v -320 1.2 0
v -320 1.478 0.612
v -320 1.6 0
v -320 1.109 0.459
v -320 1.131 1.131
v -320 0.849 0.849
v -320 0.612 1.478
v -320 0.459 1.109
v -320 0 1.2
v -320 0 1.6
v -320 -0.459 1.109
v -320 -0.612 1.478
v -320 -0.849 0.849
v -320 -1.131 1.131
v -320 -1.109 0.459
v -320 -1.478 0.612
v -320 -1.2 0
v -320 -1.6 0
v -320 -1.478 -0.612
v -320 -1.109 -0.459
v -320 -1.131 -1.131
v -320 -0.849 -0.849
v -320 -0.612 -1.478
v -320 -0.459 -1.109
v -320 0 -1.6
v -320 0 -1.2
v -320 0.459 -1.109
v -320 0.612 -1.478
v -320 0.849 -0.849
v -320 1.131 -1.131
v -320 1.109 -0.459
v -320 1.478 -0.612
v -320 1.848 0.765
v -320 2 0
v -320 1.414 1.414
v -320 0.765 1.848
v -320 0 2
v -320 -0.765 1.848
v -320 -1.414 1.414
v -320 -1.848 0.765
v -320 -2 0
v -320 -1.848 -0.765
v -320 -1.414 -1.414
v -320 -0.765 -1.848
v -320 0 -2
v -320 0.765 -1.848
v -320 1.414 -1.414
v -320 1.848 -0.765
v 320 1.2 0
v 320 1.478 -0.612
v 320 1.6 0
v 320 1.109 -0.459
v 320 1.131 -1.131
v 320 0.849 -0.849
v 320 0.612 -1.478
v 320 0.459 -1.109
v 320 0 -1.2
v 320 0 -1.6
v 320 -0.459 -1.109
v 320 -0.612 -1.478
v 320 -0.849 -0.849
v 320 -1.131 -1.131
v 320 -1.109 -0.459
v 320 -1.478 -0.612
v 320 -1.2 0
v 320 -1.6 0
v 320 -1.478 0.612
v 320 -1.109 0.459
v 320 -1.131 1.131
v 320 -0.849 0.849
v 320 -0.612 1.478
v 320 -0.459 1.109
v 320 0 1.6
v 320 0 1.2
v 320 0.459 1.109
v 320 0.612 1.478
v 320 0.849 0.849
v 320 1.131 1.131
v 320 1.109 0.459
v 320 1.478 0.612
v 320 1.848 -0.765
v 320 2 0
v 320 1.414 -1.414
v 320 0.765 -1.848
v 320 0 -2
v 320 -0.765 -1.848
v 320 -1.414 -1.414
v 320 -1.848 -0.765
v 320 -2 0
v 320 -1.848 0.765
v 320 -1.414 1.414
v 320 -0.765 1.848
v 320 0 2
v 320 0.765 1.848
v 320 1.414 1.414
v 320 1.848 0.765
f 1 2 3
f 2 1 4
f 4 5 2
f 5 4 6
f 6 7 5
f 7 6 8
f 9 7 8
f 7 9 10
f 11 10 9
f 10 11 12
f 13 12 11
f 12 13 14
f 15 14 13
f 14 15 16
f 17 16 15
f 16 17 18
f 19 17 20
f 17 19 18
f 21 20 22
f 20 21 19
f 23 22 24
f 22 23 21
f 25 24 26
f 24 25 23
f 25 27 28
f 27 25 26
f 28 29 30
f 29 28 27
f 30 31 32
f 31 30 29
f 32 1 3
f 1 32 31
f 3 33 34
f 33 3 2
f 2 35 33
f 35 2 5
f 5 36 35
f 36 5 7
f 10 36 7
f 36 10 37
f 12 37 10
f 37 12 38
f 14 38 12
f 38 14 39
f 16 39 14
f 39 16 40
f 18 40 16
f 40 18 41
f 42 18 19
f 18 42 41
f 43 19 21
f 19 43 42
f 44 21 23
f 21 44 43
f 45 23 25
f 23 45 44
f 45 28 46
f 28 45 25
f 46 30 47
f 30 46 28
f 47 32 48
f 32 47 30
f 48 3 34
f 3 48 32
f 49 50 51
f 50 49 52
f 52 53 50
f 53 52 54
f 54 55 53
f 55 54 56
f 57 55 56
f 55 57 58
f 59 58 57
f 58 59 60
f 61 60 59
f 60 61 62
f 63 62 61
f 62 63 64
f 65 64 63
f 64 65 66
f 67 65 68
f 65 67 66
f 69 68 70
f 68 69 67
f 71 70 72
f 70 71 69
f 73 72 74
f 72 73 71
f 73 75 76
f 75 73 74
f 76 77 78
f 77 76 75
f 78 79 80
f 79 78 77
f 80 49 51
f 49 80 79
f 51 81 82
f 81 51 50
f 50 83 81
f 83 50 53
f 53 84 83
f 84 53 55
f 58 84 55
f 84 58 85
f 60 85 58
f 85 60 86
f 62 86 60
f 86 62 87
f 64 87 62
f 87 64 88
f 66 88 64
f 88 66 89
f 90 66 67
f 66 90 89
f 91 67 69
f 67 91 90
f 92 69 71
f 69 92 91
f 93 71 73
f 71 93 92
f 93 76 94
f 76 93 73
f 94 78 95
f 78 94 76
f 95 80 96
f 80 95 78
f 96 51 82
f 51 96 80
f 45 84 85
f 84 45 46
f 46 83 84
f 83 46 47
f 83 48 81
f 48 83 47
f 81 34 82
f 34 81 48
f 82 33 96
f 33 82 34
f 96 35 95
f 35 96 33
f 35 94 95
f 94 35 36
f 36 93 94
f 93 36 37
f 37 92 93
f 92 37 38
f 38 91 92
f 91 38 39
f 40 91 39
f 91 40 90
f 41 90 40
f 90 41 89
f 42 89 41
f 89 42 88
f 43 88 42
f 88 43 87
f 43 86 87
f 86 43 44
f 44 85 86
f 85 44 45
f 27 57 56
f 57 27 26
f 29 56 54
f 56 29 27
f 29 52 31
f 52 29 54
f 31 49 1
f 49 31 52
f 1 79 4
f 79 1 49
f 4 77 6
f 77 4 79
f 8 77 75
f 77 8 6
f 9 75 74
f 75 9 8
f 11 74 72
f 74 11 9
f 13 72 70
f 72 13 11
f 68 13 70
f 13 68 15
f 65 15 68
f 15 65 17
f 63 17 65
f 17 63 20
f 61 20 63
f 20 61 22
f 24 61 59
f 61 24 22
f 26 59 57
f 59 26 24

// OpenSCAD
// file: ../p/4-4disc.scad
use <../lib.scad>
$fa=1; $fs=0.2;
function ldraw_lib__4_4disc(realsolid=false) = [
// 0 Disc 1.0
// 0 Name: 4-4disc.dat
// 0 Author: James Jessiman
// 0 !LDRAW_ORG Primitive UPDATE 2002-02
// 0 !LICENSE Licensed under CC BY 2.0 and CC BY 4.0 : see CAreadme.txt
// 
// 0 BFC CERTIFY CCW
  [0,"BFC","CERTIFY"],
  [0,"BFC","CCW"],
// 
// 0 !HISTORY 1998-12-15 [PTadmin] Official Update 1998-10
// 0 !HISTORY 2002-03-23 [sbliss] Added BFC statement
// 0 !HISTORY 2002-04-25 [PTadmin] Official Update 2002-02
// 0 !HISTORY 2007-06-24 [PTadmin] Header formatted for Contributor Agreement
// 0 !HISTORY 2008-07-01 [PTadmin] Official Update 2008-01
// 
// 
// 3 16 0 0 0 1 0 0 0.9239 0 0.3827
  [3,16,0,0,0,1,0,0,0.9239,0,0.3827],
// 3 16 0 0 0 0.9239 0 0.3827 0.7071 0 0.7071
  [3,16,0,0,0,0.9239,0,0.3827,0.7071,0,0.7071],
// 3 16 0 0 0 0.7071 0 0.7071 0.3827 0 0.9239
  [3,16,0,0,0,0.7071,0,0.7071,0.3827,0,0.9239],
// 3 16 0 0 0 0.3827 0 0.9239 0 0 1
  [3,16,0,0,0,0.3827,0,0.9239,0,0,1],
// 3 16 0 0 0 0 0 1 -0.3827 0 0.9239
  [3,16,0,0,0,0,0,1,-0.3827,0,0.9239],
// 3 16 0 0 0 -0.3827 0 0.9239 -0.7071 0 0.7071
  [3,16,0,0,0,-0.3827,0,0.9239,-0.7071,0,0.7071],
// 3 16 0 0 0 -0.7071 0 0.7071 -0.9239 0 0.3827
  [3,16,0,0,0,-0.7071,0,0.7071,-0.9239,0,0.3827],
// 3 16 0 0 0 -0.9239 0 0.3827 -1 0 -0
  [3,16,0,0,0,-0.9239,0,0.3827,-1,0,-0],
// 3 16 0 0 0 -1 0 -0 -0.9239 0 -0.3827
  [3,16,0,0,0,-1,0,-0,-0.9239,0,-0.3827],
// 3 16 0 0 0 -0.9239 0 -0.3827 -0.7071 0 -0.7071
  [3,16,0,0,0,-0.9239,0,-0.3827,-0.7071,0,-0.7071],
// 3 16 0 0 0 -0.7071 0 -0.7071 -0.3827 0 -0.9239
  [3,16,0,0,0,-0.7071,0,-0.7071,-0.3827,0,-0.9239],
// 3 16 0 0 0 -0.3827 0 -0.9239 0 0 -1
  [3,16,0,0,0,-0.3827,0,-0.9239,0,0,-1],
// 3 16 0 0 0 0 0 -1 0.3827 0 -0.9239
  [3,16,0,0,0,0,0,-1,0.3827,0,-0.9239],
// 3 16 0 0 0 0.3827 0 -0.9239 0.7071 0 -0.7071
  [3,16,0,0,0,0.3827,0,-0.9239,0.7071,0,-0.7071],
// 3 16 0 0 0 0.7071 0 -0.7071 0.9239 0 -0.3827
  [3,16,0,0,0,0.7071,0,-0.7071,0.9239,0,-0.3827],
// 3 16 0 0 0 0.9239 0 -0.3827 1 0 0
  [3,16,0,0,0,0.9239,0,-0.3827,1,0,0],
// 0
];
module ldraw_lib__4_4disc(step=0, col=false, unit=2/5, alt=false, line=0.2, solid=!$preview)
    makepoly(ldraw_lib__4_4disc(solid), step=step, col=col, unit=unit, alt=alt, line=line, solid=solid);
ldraw_lib__4_4disc(line=0.2);
// file: ../p/stud3.scad
use <../lib.scad>
use <4-4cyli.scad>
use <4-4disc.scad>
use <4-4edge.scad>
$fa=1; $fs=0.2;
function ldraw_lib__stud3(realsolid=false) = realsolid ? 
    [openscad(translate([0,0,-eps()], o=cylinder(4+eps(), r=4)),2)] : [
// 0 Stud Tube Solid
// 0 Name: stud3.dat
// 0 Author: James Jessiman
// 0 !LDRAW_ORG Primitive UPDATE 2012-01
// 0 !LICENSE Licensed under CC BY 2.0 and CC BY 4.0 : see CAreadme.txt
// 
// 0 BFC CERTIFY CCW
  [0,"BFC","CERTIFY"],
  [0,"BFC","CCW"],
// 
// 0 !HISTORY 2002-04-04 [sbliss] Modified for BFC compliance
// 0 !HISTORY 2002-04-25 [PTadmin] Official Update 2002-02
// 0 !HISTORY 2007-06-24 [PTadmin] Header formatted for Contributor Agreement
// 0 !HISTORY 2008-07-01 [PTadmin] Official Update 2008-01
// 0 !HISTORY 2012-02-16 [Philo] Changed to CCW
// 0 !HISTORY 2012-03-30 [PTadmin] Official Update 2012-01
// 
// 
// 1 16 0 -4 0 4 0 0 0 1 0 0 0 4 4-4edge.dat
  [1,16,0,-4,0,4,0,0,0,1,0,0,0,4, ldraw_lib__4_4edge(realsolid)],
// 1 16 0 0 0 4 0 0 0 1 0 0 0 4 4-4edge.dat
  [1,16,0,0,0,4,0,0,0,1,0,0,0,4, ldraw_lib__4_4edge(realsolid)],
// 1 16 0 -4 0 4 0 0 0 1 0 0 0 4 4-4disc.dat
  [1,16,0,-4,0,4,0,0,0,1,0,0,0,4, ldraw_lib__4_4disc(realsolid)],
// 1 16 0 -4 0 4 0 0 0 4 0 0 0 4 4-4cyli.dat
  [1,16,0,-4,0,4,0,0,0,4,0,0,0,4, ldraw_lib__4_4cyli(realsolid)],
];
module ldraw_lib__stud3(step=0, col=false, unit=2/5, alt=false, line=0.2, solid=!$preview)
    makepoly(ldraw_lib__stud3(solid), step=step, col=col, unit=unit, alt=alt, line=line, solid=solid);
ldraw_lib__stud3(line=0.2);
// file: ../p/stud.scad
use <../lib.scad>
use <4-4cyli.scad>
use <4-4disc.scad>
use <4-4edge.scad>
$fa=1; $fs=0.2;
function ldraw_lib__stud(realsolid=false) = realsolid ? 
    [openscad(translate([0,0,-eps()], o=cylinder(4+eps(), r=6)),2)] : [
// 0 Stud
// 0 Name: stud.dat
// 0 Author: James Jessiman
// 0 !LDRAW_ORG Primitive UPDATE 2012-01
// 0 !LICENSE Licensed under CC BY 2.0 and CC BY 4.0 : see CAreadme.txt
// 
// 0 BFC CERTIFY CCW
  [0,"BFC","CERTIFY"],
  [0,"BFC","CCW"],
// 
// 0 !HISTORY 2002-04-04 [sbliss] Modified for BFC compliance
// 0 !HISTORY 2002-04-25 [PTadmin] Official Update 2002-02
// 0 !HISTORY 2007-06-24 [PTadmin] Header formatted for Contributor Agreement
// 0 !HISTORY 2008-07-01 [PTadmin] Official Update 2008-01
// 0 !HISTORY 2012-02-16 [Philo] Changed to CCW
// 0 !HISTORY 2012-03-30 [PTadmin] Official Update 2012-01
// 
// 
// 1 16 0 0 0 6 0 0 0 1 0 0 0 6 4-4edge.dat
  [1,16,0,0,0,6,0,0,0,1,0,0,0,6, ldraw_lib__4_4edge(realsolid)],
// 1 16 0 -4 0 6 0 0 0 1 0 0 0 6 4-4edge.dat
  [1,16,0,-4,0,6,0,0,0,1,0,0,0,6, ldraw_lib__4_4edge(realsolid)],
// 1 16 0 0 0 6 0 0 0 -4 0 0 0 6 4-4cyli.dat
  [1,16,0,0,0,6,0,0,0,-4,0,0,0,6, ldraw_lib__4_4cyli(realsolid)],
// 1 16 0 -4 0 6 0 0 0 1 0 0 0 6 4-4disc.dat
  [1,16,0,-4,0,6,0,0,0,1,0,0,0,6, ldraw_lib__4_4disc(realsolid)],
];
module ldraw_lib__stud(step=0, col=false, unit=2/5, alt=false, line=0.2, solid=!$preview)
    makepoly(ldraw_lib__stud(solid), step=step, col=col, unit=unit, alt=alt, line=line, solid=solid);
ldraw_lib__stud(line=0.2);
// file: ../p/box5.scad
use <../lib.scad>
$fa=1; $fs=0.2;
function ldraw_lib__box5(realsolid=false) = [
// 0 Box with 5 Faces and All Edges
// 0 Name: box5.dat
// 0 Author: James Jessiman
// 0 !LDRAW_ORG Primitive UPDATE 2012-01
// 0 !LICENSE Licensed under CC BY 2.0 and CC BY 4.0 : see CAreadme.txt
// 
// 0 BFC CERTIFY CCW
  [0,"BFC","CERTIFY"],
  [0,"BFC","CCW"],
// 
// 0 !HISTORY 2002-04-03 [sbliss] Modified for BFC compliance
// 0 !HISTORY 2002-04-25 [PTadmin] Official Update 2002-02
// 0 !HISTORY 2007-06-24 [PTadmin] Header formatted for Contributor Agreement
// 0 !HISTORY 2008-07-01 [PTadmin] Official Update 2008-01
// 0 !HISTORY 2012-02-16 [Philo] Changed to CCW
// 0 !HISTORY 2012-03-30 [PTadmin] Official Update 2012-01
// 
// 
// 2 24 1 1 1 -1 1 1
  [2,24,1,1,1,-1,1,1],
// 2 24 -1 1 1 -1 1 -1
  [2,24,-1,1,1,-1,1,-1],
// 2 24 -1 1 -1 1 1 -1
  [2,24,-1,1,-1,1,1,-1],
// 2 24 1 1 -1 1 1 1
  [2,24,1,1,-1,1,1,1],
// 2 24 1 0 1 -1 0 1
  [2,24,1,0,1,-1,0,1],
// 2 24 -1 0 1 -1 0 -1
  [2,24,-1,0,1,-1,0,-1],
// 2 24 -1 0 -1 1 0 -1
  [2,24,-1,0,-1,1,0,-1],
// 2 24 1 0 -1 1 0 1
  [2,24,1,0,-1,1,0,1],
// 2 24 1 0 1 1 1 1
  [2,24,1,0,1,1,1,1],
// 2 24 -1 0 1 -1 1 1
  [2,24,-1,0,1,-1,1,1],
// 2 24 1 0 -1 1 1 -1
  [2,24,1,0,-1,1,1,-1],
// 2 24 -1 0 -1 -1 1 -1
  [2,24,-1,0,-1,-1,1,-1],
// 4 16 -1 1 1 1 1 1 1 1 -1 -1 1 -1
  [4,16,-1,1,1,1,1,1,1,1,-1,-1,1,-1],
// 4 16 -1 1 1 -1 0 1 1 0 1 1 1 1
  [4,16,-1,1,1,-1,0,1,1,0,1,1,1,1],
// 4 16 -1 1 -1 -1 0 -1 -1 0 1 -1 1 1
  [4,16,-1,1,-1,-1,0,-1,-1,0,1,-1,1,1],
// 4 16 1 1 -1 1 0 -1 -1 0 -1 -1 1 -1
  [4,16,1,1,-1,1,0,-1,-1,0,-1,-1,1,-1],
// 4 16 1 1 1 1 0 1 1 0 -1 1 1 -1
  [4,16,1,1,1,1,0,1,1,0,-1,1,1,-1],
];
module ldraw_lib__box5(step=0, col=false, unit=2/5, alt=false, line=0.2, solid=!$preview)
    makepoly(ldraw_lib__box5(solid), step=step, col=col, unit=unit, alt=alt, line=line, solid=solid);
ldraw_lib__box5(line=0.2);
// file: ../p/box4t.scad
use <../lib.scad>
$fa=1; $fs=0.2;
function ldraw_lib__box4t(realsolid=false) = [
// 0 Box with 4 Adjacent Faces and All Edges
// 0 Name: box4t.dat
// 0 Author: Tore Eriksson [Tore_Eriksson]
// 0 !LDRAW_ORG Primitive UPDATE 2003-02
// 0 !LICENSE Licensed under CC BY 2.0 and CC BY 4.0 : see CAreadme.txt
// 
// 0 BFC CERTIFY CCW
  [0,"BFC","CERTIFY"],
  [0,"BFC","CCW"],
// 
// 0 !HISTORY 1997-09-29 [PTadmin] Official Update 1997-15
// 0 !HISTORY 2002-08-31 [izanette] Modified with WINDZ for BFC compliance
// 0 !HISTORY 2003-08-01 [PTadmin] Official Update 2003-02
// 0 !HISTORY 2007-06-24 [PTadmin] Header formatted for Contributor Agreement
// 0 !HISTORY 2008-07-01 [PTadmin] Official Update 2008-01
// 
// 
// 2 24 1 1 1 -1 1 1
  [2,24,1,1,1,-1,1,1],
// 2 24 -1 1 1 -1 1 -1
  [2,24,-1,1,1,-1,1,-1],
// 2 24 -1 1 -1 1 1 -1
  [2,24,-1,1,-1,1,1,-1],
// 2 24 1 1 -1 1 1 1
  [2,24,1,1,-1,1,1,1],
// 2 24 1 0 1 -1 0 1
  [2,24,1,0,1,-1,0,1],
// 2 24 -1 0 1 -1 0 -1
  [2,24,-1,0,1,-1,0,-1],
// 2 24 -1 0 -1 1 0 -1
  [2,24,-1,0,-1,1,0,-1],
// 2 24 1 0 -1 1 0 1
  [2,24,1,0,-1,1,0,1],
// 2 24 1 0 1 1 1 1
  [2,24,1,0,1,1,1,1],
// 2 24 -1 0 1 -1 1 1
  [2,24,-1,0,1,-1,1,1],
// 2 24 1 0 -1 1 1 -1
  [2,24,1,0,-1,1,1,-1],
// 2 24 -1 0 -1 -1 1 -1
  [2,24,-1,0,-1,-1,1,-1],
// 4 16 1 1 1 1 1 -1 -1 1 -1 -1 1 1
  [4,16,1,1,1,1,1,-1,-1,1,-1,-1,1,1],
// 4 16 1 1 1 -1 1 1 -1 0 1 1 0 1
  [4,16,1,1,1,-1,1,1,-1,0,1,1,0,1],
// 4 16 -1 1 1 -1 1 -1 -1 0 -1 -1 0 1
  [4,16,-1,1,1,-1,1,-1,-1,0,-1,-1,0,1],
// 0 4 16 -1 1 -1 -1 0 -1 1 0 -1 1 1 -1
// 4 16 1 1 -1 1 1 1 1 0 1 1 0 -1
  [4,16,1,1,-1,1,1,1,1,0,1,1,0,-1],
// 0
];
module ldraw_lib__box4t(step=0, col=false, unit=2/5, alt=false, line=0.2, solid=!$preview)
    makepoly(ldraw_lib__box4t(solid), step=step, col=col, unit=unit, alt=alt, line=line, solid=solid);
ldraw_lib__box4t(line=0.2);
// file: s/3004s01.scad
use <../../lib.scad>
use <../../p/box4t.scad>
use <../../p/box5.scad>
use <../../p/stud.scad>
use <../../p/stud3.scad>
$fa=1; $fs=0.2;
function ldraw_lib__s__3004s01(realsolid=false) = [
// 0 ~Brick  1 x  2 without Front Face
// 0 Name: s\3004s01.dat
// 0 Author: James Jessiman
// 0 !LDRAW_ORG Subpart UPDATE 2003-03
// 0 !LICENSE Licensed under CC BY 2.0 and CC BY 4.0 : see CAreadme.txt
// 
// 0 BFC CERTIFY CCW
  [0,"BFC","CERTIFY"],
  [0,"BFC","CCW"],
// 
// 0 !HISTORY 2003-09-07 [jriley] Subfiling, BFC
// 0 !HISTORY 2003-12-19 [PTadmin] Official Update 2003-03
// 0 !HISTORY 2007-08-29 [PTadmin] Header formatted for Contributor Agreement
// 0 !HISTORY 2008-07-01 [PTadmin] Official Update 2008-01
// 
// 
// 1 16 0 4 0 1 0 0 0 -5 0 0 0 1 stud3.dat
  [1,16,0,4,0,1,0,0,0,-5,0,0,0,1, ldraw_lib__stud3(realsolid)],
// 0 BFC INVERTNEXT
  [0,"BFC","INVERTNEXT"],
// 1 16 0 24 0 16 0 0 0 -20 0 0 0 6 box5.dat
  [1,16,0,24,0,16,0,0,0,-20,0,0,0,6, ldraw_lib__box5(realsolid)],
// 4 16 20 24 10 16 24 6 -16 24 6 -20 24 10
  [4,16,20,24,10,16,24,6,-16,24,6,-20,24,10],
// 4 16 -20 24 10 -16 24 6 -16 24 -6 -20 24 -10
  [4,16,-20,24,10,-16,24,6,-16,24,-6,-20,24,-10],
// 4 16 -20 24 -10 -16 24 -6 16 24 -6 20 24 -10
  [4,16,-20,24,-10,-16,24,-6,16,24,-6,20,24,-10],
// 4 16 20 24 -10 16 24 -6 16 24 6 20 24 10
  [4,16,20,24,-10,16,24,-6,16,24,6,20,24,10],
// 1 16 0 24 0 20 0 0 0 -24 0 0 0 10 box4t.dat
  [1,16,0,24,0,20,0,0,0,-24,0,0,0,10, ldraw_lib__box4t(realsolid)],
// 1 16 10 0 0 1 0 0 0 1 0 0 0 1 stud.dat
  [1,16,10,0,0,1,0,0,0,1,0,0,0,1, ldraw_lib__stud(realsolid)],
// 1 16 -10 0 0 1 0 0 0 1 0 0 0 1 stud.dat
  [1,16,-10,0,0,1,0,0,0,1,0,0,0,1, ldraw_lib__stud(realsolid)],
// 0
];
module ldraw_lib__s__3004s01(step=0, col=false, unit=2/5, alt=false, line=0.2, solid=!$preview)
    makepoly(ldraw_lib__s__3004s01(solid), step=step, col=col, unit=unit, alt=alt, line=line, solid=solid);
ldraw_lib__s__3004s01(line=0.2);
// file: ../p/4-4cyli.scad
use <../lib.scad>
$fa=1; $fs=0.2;
function ldraw_lib__4_4cyli(realsolid=false) = [
// 0 Cylinder 1.0
// 0 Name: 4-4cyli.dat
// 0 Author: James Jessiman
// 0 !LDRAW_ORG Primitive UPDATE 2005-01
// 0 !LICENSE Licensed under CC BY 2.0 and CC BY 4.0 : see CAreadme.txt
// 
// 0 BFC CERTIFY CCW
  [0,"BFC","CERTIFY"],
  [0,"BFC","CCW"],
// 
// 0 !HISTORY 1998-12-15 [PTadmin] Official Update 1998-10
// 0 !HISTORY 2002-03-23 [sbliss] Added BFC statement; merged headers from files in distributions LDraw 0.27 and Complete.
// 0 !HISTORY 2002-04-25 [PTadmin] Official Update 2002-02
// 0 !HISTORY 2004-12-14 [guyvivan] BFC CCW
// 0 !HISTORY 2005-12-28 [PTadmin] Official Update 2005-01
// 0 !HISTORY 2007-06-24 [PTadmin] Header formatted for Contributor Agreement
// 0 !HISTORY 2008-07-01 [PTadmin] Official Update 2008-01
// 
// 
// 4 16 1 1 0 0.9239 1 0.3827 0.9239 0 0.3827 1 0 0
  [4,16,1,1,0,0.9239,1,0.3827,0.9239,0,0.3827,1,0,0],
// 5 24 1 0 0 1 1 0 0.9239 0 0.3827 0.9239 0 -0.3827
  [5,24,1,0,0,1,1,0,0.9239,0,0.3827,0.9239,0,-0.3827],
// 4 16 0.9239 1 0.3827 0.7071 1 0.7071 0.7071 0 0.7071 0.9239 0 0.3827
  [4,16,0.9239,1,0.3827,0.7071,1,0.7071,0.7071,0,0.7071,0.9239,0,0.3827],
// 5 24 0.9239 0 0.3827 0.9239 1 0.3827 0.7071 0 0.7071 1 0 0
  [5,24,0.9239,0,0.3827,0.9239,1,0.3827,0.7071,0,0.7071,1,0,0],
// 4 16 0.7071 1 0.7071 0.3827 1 0.9239 0.3827 0 0.9239 0.7071 0 0.7071
  [4,16,0.7071,1,0.7071,0.3827,1,0.9239,0.3827,0,0.9239,0.7071,0,0.7071],
// 5 24 0.7071 0 0.7071 0.7071 1 0.7071 0.3827 0 0.9239 0.9239 0 0.3827
  [5,24,0.7071,0,0.7071,0.7071,1,0.7071,0.3827,0,0.9239,0.9239,0,0.3827],
// 4 16 0.3827 1 0.9239 0 1 1 0 0 1 0.3827 0 0.9239
  [4,16,0.3827,1,0.9239,0,1,1,0,0,1,0.3827,0,0.9239],
// 5 24 0.3827 0 0.9239 0.3827 1 0.9239 0 0 1 0.7071 0 0.7071
  [5,24,0.3827,0,0.9239,0.3827,1,0.9239,0,0,1,0.7071,0,0.7071],
// 4 16 0 1 1 -0.3827 1 0.9239 -0.3827 0 0.9239 0 0 1
  [4,16,0,1,1,-0.3827,1,0.9239,-0.3827,0,0.9239,0,0,1],
// 5 24 0 0 1 0 1 1 -0.3827 0 0.9239 0.3827 0 0.9239
  [5,24,0,0,1,0,1,1,-0.3827,0,0.9239,0.3827,0,0.9239],
// 4 16 -0.3827 1 0.9239 -0.7071 1 0.7071 -0.7071 0 0.7071 -0.3827 0 0.9239
  [4,16,-0.3827,1,0.9239,-0.7071,1,0.7071,-0.7071,0,0.7071,-0.3827,0,0.9239],
// 5 24 -0.3827 0 0.9239 -0.3827 1 0.9239 -0.7071 0 0.7071 0 0 1
  [5,24,-0.3827,0,0.9239,-0.3827,1,0.9239,-0.7071,0,0.7071,0,0,1],
// 4 16 -0.7071 1 0.7071 -0.9239 1 0.3827 -0.9239 0 0.3827 -0.7071 0 0.7071
  [4,16,-0.7071,1,0.7071,-0.9239,1,0.3827,-0.9239,0,0.3827,-0.7071,0,0.7071],
// 5 24 -0.7071 0 0.7071 -0.7071 1 0.7071 -0.9239 0 0.3827 -0.3827 0 0.9239
  [5,24,-0.7071,0,0.7071,-0.7071,1,0.7071,-0.9239,0,0.3827,-0.3827,0,0.9239],
// 4 16 -0.9239 1 0.3827 -1 1 0 -1 0 0 -0.9239 0 0.3827
  [4,16,-0.9239,1,0.3827,-1,1,0,-1,0,0,-0.9239,0,0.3827],
// 5 24 -0.9239 0 0.3827 -0.9239 1 0.3827 -1 0 0 -0.7071 0 0.7071
  [5,24,-0.9239,0,0.3827,-0.9239,1,0.3827,-1,0,0,-0.7071,0,0.7071],
// 4 16 -1 1 0 -0.9239 1 -0.3827 -0.9239 0 -0.3827 -1 0 0
  [4,16,-1,1,0,-0.9239,1,-0.3827,-0.9239,0,-0.3827,-1,0,0],
// 5 24 -1 0 0 -1 1 0 -0.9239 0 -0.3827 -0.9239 0 0.3827
  [5,24,-1,0,0,-1,1,0,-0.9239,0,-0.3827,-0.9239,0,0.3827],
// 4 16 -0.9239 1 -0.3827 -0.7071 1 -0.7071 -0.7071 0 -0.7071 -0.9239 0 -0.3827
  [4,16,-0.9239,1,-0.3827,-0.7071,1,-0.7071,-0.7071,0,-0.7071,-0.9239,0,-0.3827],
// 5 24 -0.9239 0 -0.3827 -0.9239 1 -0.3827 -0.7071 0 -0.7071 -1 0 0
  [5,24,-0.9239,0,-0.3827,-0.9239,1,-0.3827,-0.7071,0,-0.7071,-1,0,0],
// 4 16 -0.7071 1 -0.7071 -0.3827 1 -0.9239 -0.3827 0 -0.9239 -0.7071 0 -0.7071
  [4,16,-0.7071,1,-0.7071,-0.3827,1,-0.9239,-0.3827,0,-0.9239,-0.7071,0,-0.7071],
// 5 24 -0.7071 0 -0.7071 -0.7071 1 -0.7071 -0.3827 0 -0.9239 -0.9239 0 -0.3827
  [5,24,-0.7071,0,-0.7071,-0.7071,1,-0.7071,-0.3827,0,-0.9239,-0.9239,0,-0.3827],
// 4 16 -0.3827 1 -0.9239 0 1 -1 0 0 -1 -0.3827 0 -0.9239
  [4,16,-0.3827,1,-0.9239,0,1,-1,0,0,-1,-0.3827,0,-0.9239],
// 5 24 -0.3827 0 -0.9239 -0.3827 1 -0.9239 0 0 -1 -0.7071 0 -0.7071
  [5,24,-0.3827,0,-0.9239,-0.3827,1,-0.9239,0,0,-1,-0.7071,0,-0.7071],
// 4 16 0 1 -1 0.3827 1 -0.9239 0.3827 0 -0.9239 0 0 -1
  [4,16,0,1,-1,0.3827,1,-0.9239,0.3827,0,-0.9239,0,0,-1],
// 5 24 0 0 -1 0 1 -1 0.3827 0 -0.9239 -0.3827 0 -0.9239
  [5,24,0,0,-1,0,1,-1,0.3827,0,-0.9239,-0.3827,0,-0.9239],
// 4 16 0.3827 1 -0.9239 0.7071 1 -0.7071 0.7071 0 -0.7071 0.3827 0 -0.9239
  [4,16,0.3827,1,-0.9239,0.7071,1,-0.7071,0.7071,0,-0.7071,0.3827,0,-0.9239],
// 5 24 0.3827 0 -0.9239 0.3827 1 -0.9239 0.7071 0 -0.7071 0 0 -1
  [5,24,0.3827,0,-0.9239,0.3827,1,-0.9239,0.7071,0,-0.7071,0,0,-1],
// 4 16 0.7071 1 -0.7071 0.9239 1 -0.3827 0.9239 0 -0.3827 0.7071 0 -0.7071
  [4,16,0.7071,1,-0.7071,0.9239,1,-0.3827,0.9239,0,-0.3827,0.7071,0,-0.7071],
// 5 24 0.7071 0 -0.7071 0.7071 1 -0.7071 0.9239 0 -0.3827 0.3827 0 -0.9239
  [5,24,0.7071,0,-0.7071,0.7071,1,-0.7071,0.9239,0,-0.3827,0.3827,0,-0.9239],
// 4 16 0.9239 1 -0.3827 1 1 0 1 0 0 0.9239 0 -0.3827
  [4,16,0.9239,1,-0.3827,1,1,0,1,0,0,0.9239,0,-0.3827],
// 5 24 0.9239 0 -0.3827 0.9239 1 -0.3827 1 0 0 0.7071 0 -0.7071
  [5,24,0.9239,0,-0.3827,0.9239,1,-0.3827,1,0,0,0.7071,0,-0.7071],
// 0
];
module ldraw_lib__4_4cyli(step=0, col=false, unit=2/5, alt=false, line=0.2, solid=!$preview)
    makepoly(ldraw_lib__4_4cyli(solid), step=step, col=col, unit=unit, alt=alt, line=line, solid=solid);
ldraw_lib__4_4cyli(line=0.2);
// file: ../p/4-4ring4.scad
use <../lib.scad>
$fa=1; $fs=0.2;
function ldraw_lib__4_4ring4(realsolid=false) = [
// 0 Ring  4 x 1.0
// 0 Name: 4-4ring4.dat
// 0 Author: James Jessiman
// 0 !LDRAW_ORG Primitive UPDATE 2009-01
// 0 !LICENSE Licensed under CC BY 2.0 and CC BY 4.0 : see CAreadme.txt
// 
// 0 BFC CERTIFY CCW
  [0,"BFC","CERTIFY"],
  [0,"BFC","CCW"],
// 
// 0 !HISTORY 1998-12-15 [PTadmin] Official Update 1998-10
// 0 !HISTORY 2002-04-08 [BrickCaster] Modified for BFC compliance
// 0 !HISTORY 2002-04-25 [PTadmin] Official Update 2002-02
// 0 !HISTORY 2007-06-24 [PTadmin] Header formatted for Contributor Agreement
// 0 !HISTORY 2008-07-01 [PTadmin] Official Update 2008-01
// 0 !HISTORY 2008-08-26 [cwdee] Switch polygon winding and rename
// 0 !HISTORY 2009-05-02 [PTadmin] Official Update 2009-01
// 
// 
// 4 16 -1.9135 0 4.6195 -1.5308 0 3.6956 0 0 4 0 0 5
  [4,16,-1.9135,0,4.6195,-1.5308,0,3.6956,0,0,4,0,0,5],
// 4 16 -3.5355 0 3.5355 -2.8284 0 2.8284 -1.5308 0 3.6956 -1.9135 0 4.6195
  [4,16,-3.5355,0,3.5355,-2.8284,0,2.8284,-1.5308,0,3.6956,-1.9135,0,4.6195],
// 4 16 -4.6195 0 1.9135 -3.6956 0 1.5308 -2.8284 0 2.8284 -3.5355 0 3.5355
  [4,16,-4.6195,0,1.9135,-3.6956,0,1.5308,-2.8284,0,2.8284,-3.5355,0,3.5355],
// 4 16 -5 0 0 -4 0 0 -3.6956 0 1.5308 -4.6195 0 1.9135
  [4,16,-5,0,0,-4,0,0,-3.6956,0,1.5308,-4.6195,0,1.9135],
// 4 16 -4.6195 0 -1.9135 -3.6956 0 -1.5308 -4 0 0 -5 0 0
  [4,16,-4.6195,0,-1.9135,-3.6956,0,-1.5308,-4,0,0,-5,0,0],
// 4 16 -3.5355 0 -3.5355 -2.8284 0 -2.8284 -3.6956 0 -1.5308 -4.6195 0 -1.9135
  [4,16,-3.5355,0,-3.5355,-2.8284,0,-2.8284,-3.6956,0,-1.5308,-4.6195,0,-1.9135],
// 4 16 -1.9135 0 -4.6195 -1.5308 0 -3.6956 -2.8284 0 -2.8284 -3.5355 0 -3.5355
  [4,16,-1.9135,0,-4.6195,-1.5308,0,-3.6956,-2.8284,0,-2.8284,-3.5355,0,-3.5355],
// 4 16 0 0 -5 0 0 -4 -1.5308 0 -3.6956 -1.9135 0 -4.6195
  [4,16,0,0,-5,0,0,-4,-1.5308,0,-3.6956,-1.9135,0,-4.6195],
// 4 16 1.9135 0 -4.6195 1.5308 0 -3.6956 0 0 -4 0 0 -5
  [4,16,1.9135,0,-4.6195,1.5308,0,-3.6956,0,0,-4,0,0,-5],
// 4 16 3.5355 0 -3.5355 2.8284 0 -2.8284 1.5308 0 -3.6956 1.9135 0 -4.6195
  [4,16,3.5355,0,-3.5355,2.8284,0,-2.8284,1.5308,0,-3.6956,1.9135,0,-4.6195],
// 4 16 4.6195 0 -1.9135 3.6956 0 -1.5308 2.8284 0 -2.8284 3.5355 0 -3.5355
  [4,16,4.6195,0,-1.9135,3.6956,0,-1.5308,2.8284,0,-2.8284,3.5355,0,-3.5355],
// 4 16 5 0 0 4 0 0 3.6956 0 -1.5308 4.6195 0 -1.9135
  [4,16,5,0,0,4,0,0,3.6956,0,-1.5308,4.6195,0,-1.9135],
// 4 16 4.6195 0 1.9135 3.6956 0 1.5308 4 0 0 5 0 0
  [4,16,4.6195,0,1.9135,3.6956,0,1.5308,4,0,0,5,0,0],
// 4 16 3.5355 0 3.5355 2.8284 0 2.8284 3.6956 0 1.5308 4.6195 0 1.9135
  [4,16,3.5355,0,3.5355,2.8284,0,2.8284,3.6956,0,1.5308,4.6195,0,1.9135],
// 4 16 1.9135 0 4.6195 1.5308 0 3.6956 2.8284 0 2.8284 3.5355 0 3.5355
  [4,16,1.9135,0,4.6195,1.5308,0,3.6956,2.8284,0,2.8284,3.5355,0,3.5355],
// 4 16 0 0 5 0 0 4 1.5308 0 3.6956 1.9135 0 4.6195
  [4,16,0,0,5,0,0,4,1.5308,0,3.6956,1.9135,0,4.6195],
// 0
];
module ldraw_lib__4_4ring4(step=0, col=false, unit=2/5, alt=false, line=0.2, solid=!$preview)
    makepoly(ldraw_lib__4_4ring4(solid), step=step, col=col, unit=unit, alt=alt, line=line, solid=solid);
ldraw_lib__4_4ring4(line=0.2);
// file: ../p/4-4ring3.scad
use <../lib.scad>
$fa=1; $fs=0.2;
function ldraw_lib__4_4ring3(realsolid=false) = [
// 0 Ring  3 x 1.0
// 0 Name: 4-4ring3.dat
// 0 Author: James Jessiman
// 0 !LDRAW_ORG Primitive UPDATE 2009-01
// 0 !LICENSE Licensed under CC BY 2.0 and CC BY 4.0 : see CAreadme.txt
// 
// 0 BFC CERTIFY CCW
  [0,"BFC","CERTIFY"],
  [0,"BFC","CCW"],
// 
// 0 !HISTORY 1998-12-15 [PTadmin] Official Update 1998-10
// 0 !HISTORY 2002-04-05 [hafhead] Added BFC statement
// 0 !HISTORY 2002-04-25 [PTadmin] Official Update 2002-02
// 0 !HISTORY 2007-06-24 [PTadmin] Header formatted for Contributor Agreement
// 0 !HISTORY 2008-07-01 [PTadmin] Official Update 2008-01
// 0 !HISTORY 2008-08-26 [cwdee] Switch polygon winding and rename
// 0 !HISTORY 2009-05-02 [PTadmin] Official Update 2009-01
// 
// 
// 4 16 -1.5308 0 3.6956 -1.1481 0 2.7717 0 0 3 0 0 4
  [4,16,-1.5308,0,3.6956,-1.1481,0,2.7717,0,0,3,0,0,4],
// 4 16 -2.8284 0 2.8284 -2.1213 0 2.1213 -1.1481 0 2.7717 -1.5308 0 3.6956
  [4,16,-2.8284,0,2.8284,-2.1213,0,2.1213,-1.1481,0,2.7717,-1.5308,0,3.6956],
// 4 16 -3.6956 0 1.5308 -2.7717 0 1.1481 -2.1213 0 2.1213 -2.8284 0 2.8284
  [4,16,-3.6956,0,1.5308,-2.7717,0,1.1481,-2.1213,0,2.1213,-2.8284,0,2.8284],
// 4 16 -4 0 0 -3 0 0 -2.7717 0 1.1481 -3.6956 0 1.5308
  [4,16,-4,0,0,-3,0,0,-2.7717,0,1.1481,-3.6956,0,1.5308],
// 4 16 -3.6956 0 -1.5308 -2.7717 0 -1.1481 -3 0 0 -4 0 0
  [4,16,-3.6956,0,-1.5308,-2.7717,0,-1.1481,-3,0,0,-4,0,0],
// 4 16 -2.8284 0 -2.8284 -2.1213 0 -2.1213 -2.7717 0 -1.1481 -3.6956 0 -1.5308
  [4,16,-2.8284,0,-2.8284,-2.1213,0,-2.1213,-2.7717,0,-1.1481,-3.6956,0,-1.5308],
// 4 16 -1.5308 0 -3.6956 -1.1481 0 -2.7717 -2.1213 0 -2.1213 -2.8284 0 -2.8284
  [4,16,-1.5308,0,-3.6956,-1.1481,0,-2.7717,-2.1213,0,-2.1213,-2.8284,0,-2.8284],
// 4 16 0 0 -4 0 0 -3 -1.1481 0 -2.7717 -1.5308 0 -3.6956
  [4,16,0,0,-4,0,0,-3,-1.1481,0,-2.7717,-1.5308,0,-3.6956],
// 4 16 1.5308 0 -3.6956 1.1481 0 -2.7717 0 0 -3 0 0 -4
  [4,16,1.5308,0,-3.6956,1.1481,0,-2.7717,0,0,-3,0,0,-4],
// 4 16 2.8284 0 -2.8284 2.1213 0 -2.1213 1.1481 0 -2.7717 1.5308 0 -3.6956
  [4,16,2.8284,0,-2.8284,2.1213,0,-2.1213,1.1481,0,-2.7717,1.5308,0,-3.6956],
// 4 16 3.6956 0 -1.5308 2.7717 0 -1.1481 2.1213 0 -2.1213 2.8284 0 -2.8284
  [4,16,3.6956,0,-1.5308,2.7717,0,-1.1481,2.1213,0,-2.1213,2.8284,0,-2.8284],
// 4 16 4 0 0 3 0 0 2.7717 0 -1.1481 3.6956 0 -1.5308
  [4,16,4,0,0,3,0,0,2.7717,0,-1.1481,3.6956,0,-1.5308],
// 4 16 3.6956 0 1.5308 2.7717 0 1.1481 3 0 0 4 0 0
  [4,16,3.6956,0,1.5308,2.7717,0,1.1481,3,0,0,4,0,0],
// 4 16 2.8284 0 2.8284 2.1213 0 2.1213 2.7717 0 1.1481 3.6956 0 1.5308
  [4,16,2.8284,0,2.8284,2.1213,0,2.1213,2.7717,0,1.1481,3.6956,0,1.5308],
// 4 16 1.5308 0 3.6956 1.1481 0 2.7717 2.1213 0 2.1213 2.8284 0 2.8284
  [4,16,1.5308,0,3.6956,1.1481,0,2.7717,2.1213,0,2.1213,2.8284,0,2.8284],
// 4 16 0 0 4 0 0 3 1.1481 0 2.7717 1.5308 0 3.6956
  [4,16,0,0,4,0,0,3,1.1481,0,2.7717,1.5308,0,3.6956],
// 0
];
module ldraw_lib__4_4ring3(step=0, col=false, unit=2/5, alt=false, line=0.2, solid=!$preview)
    makepoly(ldraw_lib__4_4ring3(solid), step=step, col=col, unit=unit, alt=alt, line=line, solid=solid);
ldraw_lib__4_4ring3(line=0.2);
// file: ../p/4-4edge.scad
use <../lib.scad>
$fa=1; $fs=0.2;
function ldraw_lib__4_4edge(realsolid=false) = [
// 0 Circle 1.0
// 0 Name: 4-4edge.dat
// 0 Author: James Jessiman
// 0 !LDRAW_ORG Primitive UPDATE 2017-01
// 0 !LICENSE Licensed under CC BY 2.0 and CC BY 4.0 : see CAreadme.txt
// 
// 0 BFC CERTIFY CCW
  [0,"BFC","CERTIFY"],
  [0,"BFC","CCW"],
// 
// 0 !HISTORY 1998-12-15 [PTadmin] Official Update 1998-10
// 0 !HISTORY 2005-12-28 [PTadmin] Official Update 2005-01
// 0 !HISTORY 2007-06-24 [PTadmin] Header formatted for Contributor Agreement
// 0 !HISTORY 2008-07-01 [PTadmin] Official Update 2008-01
// 0 !HISTORY 2017-01-15 [Steffen] BFCed
// 0 !HISTORY 2017-12-30 [PTadmin] Official Update 2017-01
// 
// 
// 2 24 1 0 0 0.9239 0 0.3827
  [2,24,1,0,0,0.9239,0,0.3827],
// 2 24 0.9239 0 0.3827 0.7071 0 0.7071
  [2,24,0.9239,0,0.3827,0.7071,0,0.7071],
// 2 24 0.7071 0 0.7071 0.3827 0 0.9239
  [2,24,0.7071,0,0.7071,0.3827,0,0.9239],
// 2 24 0.3827 0 0.9239 0 0 1
  [2,24,0.3827,0,0.9239,0,0,1],
// 2 24 0 0 1 -0.3827 0 0.9239
  [2,24,0,0,1,-0.3827,0,0.9239],
// 2 24 -0.3827 0 0.9239 -0.7071 0 0.7071
  [2,24,-0.3827,0,0.9239,-0.7071,0,0.7071],
// 2 24 -0.7071 0 0.7071 -0.9239 0 0.3827
  [2,24,-0.7071,0,0.7071,-0.9239,0,0.3827],
// 2 24 -0.9239 0 0.3827 -1 0 -0
  [2,24,-0.9239,0,0.3827,-1,0,-0],
// 2 24 -1 0 -0 -0.9239 0 -0.3827
  [2,24,-1,0,-0,-0.9239,0,-0.3827],
// 2 24 -0.9239 0 -0.3827 -0.7071 0 -0.7071
  [2,24,-0.9239,0,-0.3827,-0.7071,0,-0.7071],
// 2 24 -0.7071 0 -0.7071 -0.3827 0 -0.9239
  [2,24,-0.7071,0,-0.7071,-0.3827,0,-0.9239],
// 2 24 -0.3827 0 -0.9239 0 0 -1
  [2,24,-0.3827,0,-0.9239,0,0,-1],
// 2 24 0 0 -1 0.3827 0 -0.9239
  [2,24,0,0,-1,0.3827,0,-0.9239],
// 2 24 0.3827 0 -0.9239 0.7071 0 -0.7071
  [2,24,0.3827,0,-0.9239,0.7071,0,-0.7071],
// 2 24 0.7071 0 -0.7071 0.9239 0 -0.3827
  [2,24,0.7071,0,-0.7071,0.9239,0,-0.3827],
// 2 24 0.9239 0 -0.3827 1 0 0
  [2,24,0.9239,0,-0.3827,1,0,0],
];
module ldraw_lib__4_4edge(step=0, col=false, unit=2/5, alt=false, line=0.2, solid=!$preview)
    makepoly(ldraw_lib__4_4edge(solid), step=step, col=col, unit=unit, alt=alt, line=line, solid=solid);
ldraw_lib__4_4edge(line=0.2);
// file: 3004.scad
use <../lib.scad>
use <s/3004s01.scad>
$fa=1; $fs=0.2;
function ldraw_lib__3004(realsolid=false) = [
// 0 Brick  1 x  2
// 0 Name: 3004.dat
// 0 Author: James Jessiman
// 0 !LDRAW_ORG Part UPDATE 2022-05
// 0 !LICENSE Licensed under CC BY 2.0 and CC BY 4.0 : see CAreadme.txt
// 
// 0 BFC CERTIFY CCW
  [0,"BFC","CERTIFY"],
  [0,"BFC","CCW"],
// 
// 0 !HISTORY 2001-10-26 [PTadmin] Official Update 2001-01
// 0 !HISTORY 2002-05-07 {unknown} BFC Certification
// 0 !HISTORY 2002-06-11 [PTadmin] Official Update 2002-03
// 0 !HISTORY 2007-05-07 [PTadmin] Header formatted for Contributor Agreement
// 0 !HISTORY 2008-07-01 [PTadmin] Official Update 2008-01
// 0 !HISTORY 2022-08-04 [MagFors] Using subfile
// 0 !HISTORY 2022-09-15 [PTadmin] Official Update 2022-05
// 
// 
// 1 16 0 0 0 1 0 0 0 1 0 0 0 1 s\3004s01.dat
  [1,16,0,0,0,1,0,0,0,1,0,0,0,1, ldraw_lib__s__3004s01(realsolid)],
// 4 16 -20 24 -10 20 24 -10 20 0 -10 -20 0 -10
  [4,16,-20,24,-10,20,24,-10,20,0,-10,-20,0,-10],
];
module ldraw_lib__3004(step=0, col=false, unit=2/5, alt=false, line=0.2, solid=!$preview)
    makepoly(ldraw_lib__3004(solid), step=step, col=col, unit=unit, alt=alt, line=line, solid=solid);
ldraw_lib__3004(line=0.2);
// file: 71533k03.scad
use <../lib.scad>
use <../p/4-4cyli.scad>
$fa=1; $fs=0.2;
function ldraw_lib__71533k03(realsolid=false) = [
// 0 ~Technic Pneumatic Tube Segment
// 0 Name: 71533k03.dat
// 0 Author: Jaco van der Molen [Jaco]
// 0 !LDRAW_ORG Part Flexible_Section UPDATE 2020-01
// 0 !LICENSE Licensed under CC BY 2.0 and CC BY 4.0 : see CAreadme.txt
// 
// 0 BFC CERTIFY CW
  [0,"BFC","CERTIFY"],
  [0,"BFC","CW"],
// 
// 0 !HISTORY 2003-11-30 [Steffen] BFCed
// 0 !HISTORY 2009-12-29 [PTadmin] Official Update 2009-03
// 0 !HISTORY 2020-06-27 [PTadmin] Renamed from 166
// 0 !HISTORY 2020-06-28 [PTadmin] Official Update 2020-01
// 
// 
// 1 16 0 0 0 5 0 0 0 1 0 0 0 5 4-4cyli.dat
  [1,16,0,0,0,5,0,0,0,1,0,0,0,5, ldraw_lib__4_4cyli(realsolid)],
// 0 BFC INVERTNEXT
  [0,"BFC","INVERTNEXT"],
// 1 16 0 0 0 3 0 0 0 1 0 0 0 3 4-4cyli.dat
  [1,16,0,0,0,3,0,0,0,1,0,0,0,3, ldraw_lib__4_4cyli(realsolid)],
// 0
];
module ldraw_lib__71533k03(step=0, col=false, unit=2/5, alt=false, line=0.2, solid=!$preview)
    makepoly(ldraw_lib__71533k03(solid), step=step, col=col, unit=unit, alt=alt, line=line, solid=solid);
ldraw_lib__71533k03(line=0.2);
// file: 71533k02.scad
use <../lib.scad>
use <../p/4-4edge.scad>
use <../p/4-4ring3.scad>
use <../p/4-4ring4.scad>
$fa=1; $fs=0.2;
function ldraw_lib__71533k02(realsolid=false) = [
// 0 ~Technic Pneumatic Tube End (Non-Bulged)
// 0 Name: 71533k02.dat
// 0 Author: Steffen [Steffen]
// 0 !LDRAW_ORG Part Flexible_Section UPDATE 2020-01
// 0 !LICENSE Licensed under CC BY 2.0 and CC BY 4.0 : see CAreadme.txt
// 
// 0 BFC CERTIFY CCW
  [0,"BFC","CERTIFY"],
  [0,"BFC","CCW"],
// 
// 0 !HISTORY 2020-06-28 [PTadmin] Official Update 2020-01
// 
// 
// 0 // This file goes together with 71533k01.dat and 71533k03.dat.
// 0 // Those 3 files can be used to create Technic Pneumatic Tubes
// 0 // with either bulged or non-bulged ends.
// 
// 1 16 0 0 0 1 0 0 0 1 0 0 0 1 4-4ring3.dat
  [1,16,0,0,0,1,0,0,0,1,0,0,0,1, ldraw_lib__4_4ring3(realsolid)],
// 1 16 0 0 0 1 0 0 0 1 0 0 0 1 4-4ring4.dat
  [1,16,0,0,0,1,0,0,0,1,0,0,0,1, ldraw_lib__4_4ring4(realsolid)],
// 1 16 0 0 0 3 0 0 0 3 0 0 0 3 4-4edge.dat
  [1,16,0,0,0,3,0,0,0,3,0,0,0,3, ldraw_lib__4_4edge(realsolid)],
// 1 16 0 0 0 5 0 0 0 5 0 0 0 5 4-4edge.dat
  [1,16,0,0,0,5,0,0,0,5,0,0,0,5, ldraw_lib__4_4edge(realsolid)],
];
module ldraw_lib__71533k02(step=0, col=false, unit=2/5, alt=false, line=0.2, solid=!$preview)
    makepoly(ldraw_lib__71533k02(solid), step=step, col=col, unit=unit, alt=alt, line=line, solid=solid);
ldraw_lib__71533k02(line=0.2);
// main file
use <../lib.scad>
use <71533k02.scad>
use <71533k03.scad>
$fa=1; $fs=0.2;
function ldraw_lib__96891_f1(realsolid=false) = [
// 0 Technic Pneumatic Tube 80L
// 0 Name: 96891-f1.dat
// 0 Author: Philippe Hurbain [Philo]
// 0 !LDRAW_ORG Part UPDATE 2020-02
// 0 !LICENSE Licensed under CC BY 2.0 and CC BY 4.0 : see CAreadme.txt
// 
// 0 BFC CERTIFY CCW
  [0,"BFC","CERTIFY"],
  [0,"BFC","CCW"],
// 
// 0 !KEYWORDS 640 mm
// 
// 0 !HISTORY 2020-09-05 [PTadmin] Official Update 2020-02
// 
// 
// 1 16 -800 0 0 0 1 0 1 0 0 0 0 1 71533k02.dat
  [1,16,-800,0,0,0,1,0,1,0,0,0,0,1, ldraw_lib__71533k02(realsolid)],
// 1 16 800 0 0 0 -1 0 -1 0 0 0 0 1 71533k02.dat
  [1,16,800,0,0,0,-1,0,-1,0,0,0,0,1, ldraw_lib__71533k02(realsolid)],
// 1 16 -800 0 0 0 1600 0 1 0 0 0 0 1 71533k03.dat
  [1,16,-800,0,0,0,1600,0,1,0,0,0,0,1, ldraw_lib__71533k03(realsolid)],
];
module ldraw_lib__96891_f1(step=0, col=false, unit=2/5, alt=false, line=0.2, solid=!$preview)
    makepoly(ldraw_lib__96891_f1(solid), step=step, col=col, unit=unit, alt=alt, line=line, solid=solid);
ldraw_lib__96891_f1(line=0.2);
